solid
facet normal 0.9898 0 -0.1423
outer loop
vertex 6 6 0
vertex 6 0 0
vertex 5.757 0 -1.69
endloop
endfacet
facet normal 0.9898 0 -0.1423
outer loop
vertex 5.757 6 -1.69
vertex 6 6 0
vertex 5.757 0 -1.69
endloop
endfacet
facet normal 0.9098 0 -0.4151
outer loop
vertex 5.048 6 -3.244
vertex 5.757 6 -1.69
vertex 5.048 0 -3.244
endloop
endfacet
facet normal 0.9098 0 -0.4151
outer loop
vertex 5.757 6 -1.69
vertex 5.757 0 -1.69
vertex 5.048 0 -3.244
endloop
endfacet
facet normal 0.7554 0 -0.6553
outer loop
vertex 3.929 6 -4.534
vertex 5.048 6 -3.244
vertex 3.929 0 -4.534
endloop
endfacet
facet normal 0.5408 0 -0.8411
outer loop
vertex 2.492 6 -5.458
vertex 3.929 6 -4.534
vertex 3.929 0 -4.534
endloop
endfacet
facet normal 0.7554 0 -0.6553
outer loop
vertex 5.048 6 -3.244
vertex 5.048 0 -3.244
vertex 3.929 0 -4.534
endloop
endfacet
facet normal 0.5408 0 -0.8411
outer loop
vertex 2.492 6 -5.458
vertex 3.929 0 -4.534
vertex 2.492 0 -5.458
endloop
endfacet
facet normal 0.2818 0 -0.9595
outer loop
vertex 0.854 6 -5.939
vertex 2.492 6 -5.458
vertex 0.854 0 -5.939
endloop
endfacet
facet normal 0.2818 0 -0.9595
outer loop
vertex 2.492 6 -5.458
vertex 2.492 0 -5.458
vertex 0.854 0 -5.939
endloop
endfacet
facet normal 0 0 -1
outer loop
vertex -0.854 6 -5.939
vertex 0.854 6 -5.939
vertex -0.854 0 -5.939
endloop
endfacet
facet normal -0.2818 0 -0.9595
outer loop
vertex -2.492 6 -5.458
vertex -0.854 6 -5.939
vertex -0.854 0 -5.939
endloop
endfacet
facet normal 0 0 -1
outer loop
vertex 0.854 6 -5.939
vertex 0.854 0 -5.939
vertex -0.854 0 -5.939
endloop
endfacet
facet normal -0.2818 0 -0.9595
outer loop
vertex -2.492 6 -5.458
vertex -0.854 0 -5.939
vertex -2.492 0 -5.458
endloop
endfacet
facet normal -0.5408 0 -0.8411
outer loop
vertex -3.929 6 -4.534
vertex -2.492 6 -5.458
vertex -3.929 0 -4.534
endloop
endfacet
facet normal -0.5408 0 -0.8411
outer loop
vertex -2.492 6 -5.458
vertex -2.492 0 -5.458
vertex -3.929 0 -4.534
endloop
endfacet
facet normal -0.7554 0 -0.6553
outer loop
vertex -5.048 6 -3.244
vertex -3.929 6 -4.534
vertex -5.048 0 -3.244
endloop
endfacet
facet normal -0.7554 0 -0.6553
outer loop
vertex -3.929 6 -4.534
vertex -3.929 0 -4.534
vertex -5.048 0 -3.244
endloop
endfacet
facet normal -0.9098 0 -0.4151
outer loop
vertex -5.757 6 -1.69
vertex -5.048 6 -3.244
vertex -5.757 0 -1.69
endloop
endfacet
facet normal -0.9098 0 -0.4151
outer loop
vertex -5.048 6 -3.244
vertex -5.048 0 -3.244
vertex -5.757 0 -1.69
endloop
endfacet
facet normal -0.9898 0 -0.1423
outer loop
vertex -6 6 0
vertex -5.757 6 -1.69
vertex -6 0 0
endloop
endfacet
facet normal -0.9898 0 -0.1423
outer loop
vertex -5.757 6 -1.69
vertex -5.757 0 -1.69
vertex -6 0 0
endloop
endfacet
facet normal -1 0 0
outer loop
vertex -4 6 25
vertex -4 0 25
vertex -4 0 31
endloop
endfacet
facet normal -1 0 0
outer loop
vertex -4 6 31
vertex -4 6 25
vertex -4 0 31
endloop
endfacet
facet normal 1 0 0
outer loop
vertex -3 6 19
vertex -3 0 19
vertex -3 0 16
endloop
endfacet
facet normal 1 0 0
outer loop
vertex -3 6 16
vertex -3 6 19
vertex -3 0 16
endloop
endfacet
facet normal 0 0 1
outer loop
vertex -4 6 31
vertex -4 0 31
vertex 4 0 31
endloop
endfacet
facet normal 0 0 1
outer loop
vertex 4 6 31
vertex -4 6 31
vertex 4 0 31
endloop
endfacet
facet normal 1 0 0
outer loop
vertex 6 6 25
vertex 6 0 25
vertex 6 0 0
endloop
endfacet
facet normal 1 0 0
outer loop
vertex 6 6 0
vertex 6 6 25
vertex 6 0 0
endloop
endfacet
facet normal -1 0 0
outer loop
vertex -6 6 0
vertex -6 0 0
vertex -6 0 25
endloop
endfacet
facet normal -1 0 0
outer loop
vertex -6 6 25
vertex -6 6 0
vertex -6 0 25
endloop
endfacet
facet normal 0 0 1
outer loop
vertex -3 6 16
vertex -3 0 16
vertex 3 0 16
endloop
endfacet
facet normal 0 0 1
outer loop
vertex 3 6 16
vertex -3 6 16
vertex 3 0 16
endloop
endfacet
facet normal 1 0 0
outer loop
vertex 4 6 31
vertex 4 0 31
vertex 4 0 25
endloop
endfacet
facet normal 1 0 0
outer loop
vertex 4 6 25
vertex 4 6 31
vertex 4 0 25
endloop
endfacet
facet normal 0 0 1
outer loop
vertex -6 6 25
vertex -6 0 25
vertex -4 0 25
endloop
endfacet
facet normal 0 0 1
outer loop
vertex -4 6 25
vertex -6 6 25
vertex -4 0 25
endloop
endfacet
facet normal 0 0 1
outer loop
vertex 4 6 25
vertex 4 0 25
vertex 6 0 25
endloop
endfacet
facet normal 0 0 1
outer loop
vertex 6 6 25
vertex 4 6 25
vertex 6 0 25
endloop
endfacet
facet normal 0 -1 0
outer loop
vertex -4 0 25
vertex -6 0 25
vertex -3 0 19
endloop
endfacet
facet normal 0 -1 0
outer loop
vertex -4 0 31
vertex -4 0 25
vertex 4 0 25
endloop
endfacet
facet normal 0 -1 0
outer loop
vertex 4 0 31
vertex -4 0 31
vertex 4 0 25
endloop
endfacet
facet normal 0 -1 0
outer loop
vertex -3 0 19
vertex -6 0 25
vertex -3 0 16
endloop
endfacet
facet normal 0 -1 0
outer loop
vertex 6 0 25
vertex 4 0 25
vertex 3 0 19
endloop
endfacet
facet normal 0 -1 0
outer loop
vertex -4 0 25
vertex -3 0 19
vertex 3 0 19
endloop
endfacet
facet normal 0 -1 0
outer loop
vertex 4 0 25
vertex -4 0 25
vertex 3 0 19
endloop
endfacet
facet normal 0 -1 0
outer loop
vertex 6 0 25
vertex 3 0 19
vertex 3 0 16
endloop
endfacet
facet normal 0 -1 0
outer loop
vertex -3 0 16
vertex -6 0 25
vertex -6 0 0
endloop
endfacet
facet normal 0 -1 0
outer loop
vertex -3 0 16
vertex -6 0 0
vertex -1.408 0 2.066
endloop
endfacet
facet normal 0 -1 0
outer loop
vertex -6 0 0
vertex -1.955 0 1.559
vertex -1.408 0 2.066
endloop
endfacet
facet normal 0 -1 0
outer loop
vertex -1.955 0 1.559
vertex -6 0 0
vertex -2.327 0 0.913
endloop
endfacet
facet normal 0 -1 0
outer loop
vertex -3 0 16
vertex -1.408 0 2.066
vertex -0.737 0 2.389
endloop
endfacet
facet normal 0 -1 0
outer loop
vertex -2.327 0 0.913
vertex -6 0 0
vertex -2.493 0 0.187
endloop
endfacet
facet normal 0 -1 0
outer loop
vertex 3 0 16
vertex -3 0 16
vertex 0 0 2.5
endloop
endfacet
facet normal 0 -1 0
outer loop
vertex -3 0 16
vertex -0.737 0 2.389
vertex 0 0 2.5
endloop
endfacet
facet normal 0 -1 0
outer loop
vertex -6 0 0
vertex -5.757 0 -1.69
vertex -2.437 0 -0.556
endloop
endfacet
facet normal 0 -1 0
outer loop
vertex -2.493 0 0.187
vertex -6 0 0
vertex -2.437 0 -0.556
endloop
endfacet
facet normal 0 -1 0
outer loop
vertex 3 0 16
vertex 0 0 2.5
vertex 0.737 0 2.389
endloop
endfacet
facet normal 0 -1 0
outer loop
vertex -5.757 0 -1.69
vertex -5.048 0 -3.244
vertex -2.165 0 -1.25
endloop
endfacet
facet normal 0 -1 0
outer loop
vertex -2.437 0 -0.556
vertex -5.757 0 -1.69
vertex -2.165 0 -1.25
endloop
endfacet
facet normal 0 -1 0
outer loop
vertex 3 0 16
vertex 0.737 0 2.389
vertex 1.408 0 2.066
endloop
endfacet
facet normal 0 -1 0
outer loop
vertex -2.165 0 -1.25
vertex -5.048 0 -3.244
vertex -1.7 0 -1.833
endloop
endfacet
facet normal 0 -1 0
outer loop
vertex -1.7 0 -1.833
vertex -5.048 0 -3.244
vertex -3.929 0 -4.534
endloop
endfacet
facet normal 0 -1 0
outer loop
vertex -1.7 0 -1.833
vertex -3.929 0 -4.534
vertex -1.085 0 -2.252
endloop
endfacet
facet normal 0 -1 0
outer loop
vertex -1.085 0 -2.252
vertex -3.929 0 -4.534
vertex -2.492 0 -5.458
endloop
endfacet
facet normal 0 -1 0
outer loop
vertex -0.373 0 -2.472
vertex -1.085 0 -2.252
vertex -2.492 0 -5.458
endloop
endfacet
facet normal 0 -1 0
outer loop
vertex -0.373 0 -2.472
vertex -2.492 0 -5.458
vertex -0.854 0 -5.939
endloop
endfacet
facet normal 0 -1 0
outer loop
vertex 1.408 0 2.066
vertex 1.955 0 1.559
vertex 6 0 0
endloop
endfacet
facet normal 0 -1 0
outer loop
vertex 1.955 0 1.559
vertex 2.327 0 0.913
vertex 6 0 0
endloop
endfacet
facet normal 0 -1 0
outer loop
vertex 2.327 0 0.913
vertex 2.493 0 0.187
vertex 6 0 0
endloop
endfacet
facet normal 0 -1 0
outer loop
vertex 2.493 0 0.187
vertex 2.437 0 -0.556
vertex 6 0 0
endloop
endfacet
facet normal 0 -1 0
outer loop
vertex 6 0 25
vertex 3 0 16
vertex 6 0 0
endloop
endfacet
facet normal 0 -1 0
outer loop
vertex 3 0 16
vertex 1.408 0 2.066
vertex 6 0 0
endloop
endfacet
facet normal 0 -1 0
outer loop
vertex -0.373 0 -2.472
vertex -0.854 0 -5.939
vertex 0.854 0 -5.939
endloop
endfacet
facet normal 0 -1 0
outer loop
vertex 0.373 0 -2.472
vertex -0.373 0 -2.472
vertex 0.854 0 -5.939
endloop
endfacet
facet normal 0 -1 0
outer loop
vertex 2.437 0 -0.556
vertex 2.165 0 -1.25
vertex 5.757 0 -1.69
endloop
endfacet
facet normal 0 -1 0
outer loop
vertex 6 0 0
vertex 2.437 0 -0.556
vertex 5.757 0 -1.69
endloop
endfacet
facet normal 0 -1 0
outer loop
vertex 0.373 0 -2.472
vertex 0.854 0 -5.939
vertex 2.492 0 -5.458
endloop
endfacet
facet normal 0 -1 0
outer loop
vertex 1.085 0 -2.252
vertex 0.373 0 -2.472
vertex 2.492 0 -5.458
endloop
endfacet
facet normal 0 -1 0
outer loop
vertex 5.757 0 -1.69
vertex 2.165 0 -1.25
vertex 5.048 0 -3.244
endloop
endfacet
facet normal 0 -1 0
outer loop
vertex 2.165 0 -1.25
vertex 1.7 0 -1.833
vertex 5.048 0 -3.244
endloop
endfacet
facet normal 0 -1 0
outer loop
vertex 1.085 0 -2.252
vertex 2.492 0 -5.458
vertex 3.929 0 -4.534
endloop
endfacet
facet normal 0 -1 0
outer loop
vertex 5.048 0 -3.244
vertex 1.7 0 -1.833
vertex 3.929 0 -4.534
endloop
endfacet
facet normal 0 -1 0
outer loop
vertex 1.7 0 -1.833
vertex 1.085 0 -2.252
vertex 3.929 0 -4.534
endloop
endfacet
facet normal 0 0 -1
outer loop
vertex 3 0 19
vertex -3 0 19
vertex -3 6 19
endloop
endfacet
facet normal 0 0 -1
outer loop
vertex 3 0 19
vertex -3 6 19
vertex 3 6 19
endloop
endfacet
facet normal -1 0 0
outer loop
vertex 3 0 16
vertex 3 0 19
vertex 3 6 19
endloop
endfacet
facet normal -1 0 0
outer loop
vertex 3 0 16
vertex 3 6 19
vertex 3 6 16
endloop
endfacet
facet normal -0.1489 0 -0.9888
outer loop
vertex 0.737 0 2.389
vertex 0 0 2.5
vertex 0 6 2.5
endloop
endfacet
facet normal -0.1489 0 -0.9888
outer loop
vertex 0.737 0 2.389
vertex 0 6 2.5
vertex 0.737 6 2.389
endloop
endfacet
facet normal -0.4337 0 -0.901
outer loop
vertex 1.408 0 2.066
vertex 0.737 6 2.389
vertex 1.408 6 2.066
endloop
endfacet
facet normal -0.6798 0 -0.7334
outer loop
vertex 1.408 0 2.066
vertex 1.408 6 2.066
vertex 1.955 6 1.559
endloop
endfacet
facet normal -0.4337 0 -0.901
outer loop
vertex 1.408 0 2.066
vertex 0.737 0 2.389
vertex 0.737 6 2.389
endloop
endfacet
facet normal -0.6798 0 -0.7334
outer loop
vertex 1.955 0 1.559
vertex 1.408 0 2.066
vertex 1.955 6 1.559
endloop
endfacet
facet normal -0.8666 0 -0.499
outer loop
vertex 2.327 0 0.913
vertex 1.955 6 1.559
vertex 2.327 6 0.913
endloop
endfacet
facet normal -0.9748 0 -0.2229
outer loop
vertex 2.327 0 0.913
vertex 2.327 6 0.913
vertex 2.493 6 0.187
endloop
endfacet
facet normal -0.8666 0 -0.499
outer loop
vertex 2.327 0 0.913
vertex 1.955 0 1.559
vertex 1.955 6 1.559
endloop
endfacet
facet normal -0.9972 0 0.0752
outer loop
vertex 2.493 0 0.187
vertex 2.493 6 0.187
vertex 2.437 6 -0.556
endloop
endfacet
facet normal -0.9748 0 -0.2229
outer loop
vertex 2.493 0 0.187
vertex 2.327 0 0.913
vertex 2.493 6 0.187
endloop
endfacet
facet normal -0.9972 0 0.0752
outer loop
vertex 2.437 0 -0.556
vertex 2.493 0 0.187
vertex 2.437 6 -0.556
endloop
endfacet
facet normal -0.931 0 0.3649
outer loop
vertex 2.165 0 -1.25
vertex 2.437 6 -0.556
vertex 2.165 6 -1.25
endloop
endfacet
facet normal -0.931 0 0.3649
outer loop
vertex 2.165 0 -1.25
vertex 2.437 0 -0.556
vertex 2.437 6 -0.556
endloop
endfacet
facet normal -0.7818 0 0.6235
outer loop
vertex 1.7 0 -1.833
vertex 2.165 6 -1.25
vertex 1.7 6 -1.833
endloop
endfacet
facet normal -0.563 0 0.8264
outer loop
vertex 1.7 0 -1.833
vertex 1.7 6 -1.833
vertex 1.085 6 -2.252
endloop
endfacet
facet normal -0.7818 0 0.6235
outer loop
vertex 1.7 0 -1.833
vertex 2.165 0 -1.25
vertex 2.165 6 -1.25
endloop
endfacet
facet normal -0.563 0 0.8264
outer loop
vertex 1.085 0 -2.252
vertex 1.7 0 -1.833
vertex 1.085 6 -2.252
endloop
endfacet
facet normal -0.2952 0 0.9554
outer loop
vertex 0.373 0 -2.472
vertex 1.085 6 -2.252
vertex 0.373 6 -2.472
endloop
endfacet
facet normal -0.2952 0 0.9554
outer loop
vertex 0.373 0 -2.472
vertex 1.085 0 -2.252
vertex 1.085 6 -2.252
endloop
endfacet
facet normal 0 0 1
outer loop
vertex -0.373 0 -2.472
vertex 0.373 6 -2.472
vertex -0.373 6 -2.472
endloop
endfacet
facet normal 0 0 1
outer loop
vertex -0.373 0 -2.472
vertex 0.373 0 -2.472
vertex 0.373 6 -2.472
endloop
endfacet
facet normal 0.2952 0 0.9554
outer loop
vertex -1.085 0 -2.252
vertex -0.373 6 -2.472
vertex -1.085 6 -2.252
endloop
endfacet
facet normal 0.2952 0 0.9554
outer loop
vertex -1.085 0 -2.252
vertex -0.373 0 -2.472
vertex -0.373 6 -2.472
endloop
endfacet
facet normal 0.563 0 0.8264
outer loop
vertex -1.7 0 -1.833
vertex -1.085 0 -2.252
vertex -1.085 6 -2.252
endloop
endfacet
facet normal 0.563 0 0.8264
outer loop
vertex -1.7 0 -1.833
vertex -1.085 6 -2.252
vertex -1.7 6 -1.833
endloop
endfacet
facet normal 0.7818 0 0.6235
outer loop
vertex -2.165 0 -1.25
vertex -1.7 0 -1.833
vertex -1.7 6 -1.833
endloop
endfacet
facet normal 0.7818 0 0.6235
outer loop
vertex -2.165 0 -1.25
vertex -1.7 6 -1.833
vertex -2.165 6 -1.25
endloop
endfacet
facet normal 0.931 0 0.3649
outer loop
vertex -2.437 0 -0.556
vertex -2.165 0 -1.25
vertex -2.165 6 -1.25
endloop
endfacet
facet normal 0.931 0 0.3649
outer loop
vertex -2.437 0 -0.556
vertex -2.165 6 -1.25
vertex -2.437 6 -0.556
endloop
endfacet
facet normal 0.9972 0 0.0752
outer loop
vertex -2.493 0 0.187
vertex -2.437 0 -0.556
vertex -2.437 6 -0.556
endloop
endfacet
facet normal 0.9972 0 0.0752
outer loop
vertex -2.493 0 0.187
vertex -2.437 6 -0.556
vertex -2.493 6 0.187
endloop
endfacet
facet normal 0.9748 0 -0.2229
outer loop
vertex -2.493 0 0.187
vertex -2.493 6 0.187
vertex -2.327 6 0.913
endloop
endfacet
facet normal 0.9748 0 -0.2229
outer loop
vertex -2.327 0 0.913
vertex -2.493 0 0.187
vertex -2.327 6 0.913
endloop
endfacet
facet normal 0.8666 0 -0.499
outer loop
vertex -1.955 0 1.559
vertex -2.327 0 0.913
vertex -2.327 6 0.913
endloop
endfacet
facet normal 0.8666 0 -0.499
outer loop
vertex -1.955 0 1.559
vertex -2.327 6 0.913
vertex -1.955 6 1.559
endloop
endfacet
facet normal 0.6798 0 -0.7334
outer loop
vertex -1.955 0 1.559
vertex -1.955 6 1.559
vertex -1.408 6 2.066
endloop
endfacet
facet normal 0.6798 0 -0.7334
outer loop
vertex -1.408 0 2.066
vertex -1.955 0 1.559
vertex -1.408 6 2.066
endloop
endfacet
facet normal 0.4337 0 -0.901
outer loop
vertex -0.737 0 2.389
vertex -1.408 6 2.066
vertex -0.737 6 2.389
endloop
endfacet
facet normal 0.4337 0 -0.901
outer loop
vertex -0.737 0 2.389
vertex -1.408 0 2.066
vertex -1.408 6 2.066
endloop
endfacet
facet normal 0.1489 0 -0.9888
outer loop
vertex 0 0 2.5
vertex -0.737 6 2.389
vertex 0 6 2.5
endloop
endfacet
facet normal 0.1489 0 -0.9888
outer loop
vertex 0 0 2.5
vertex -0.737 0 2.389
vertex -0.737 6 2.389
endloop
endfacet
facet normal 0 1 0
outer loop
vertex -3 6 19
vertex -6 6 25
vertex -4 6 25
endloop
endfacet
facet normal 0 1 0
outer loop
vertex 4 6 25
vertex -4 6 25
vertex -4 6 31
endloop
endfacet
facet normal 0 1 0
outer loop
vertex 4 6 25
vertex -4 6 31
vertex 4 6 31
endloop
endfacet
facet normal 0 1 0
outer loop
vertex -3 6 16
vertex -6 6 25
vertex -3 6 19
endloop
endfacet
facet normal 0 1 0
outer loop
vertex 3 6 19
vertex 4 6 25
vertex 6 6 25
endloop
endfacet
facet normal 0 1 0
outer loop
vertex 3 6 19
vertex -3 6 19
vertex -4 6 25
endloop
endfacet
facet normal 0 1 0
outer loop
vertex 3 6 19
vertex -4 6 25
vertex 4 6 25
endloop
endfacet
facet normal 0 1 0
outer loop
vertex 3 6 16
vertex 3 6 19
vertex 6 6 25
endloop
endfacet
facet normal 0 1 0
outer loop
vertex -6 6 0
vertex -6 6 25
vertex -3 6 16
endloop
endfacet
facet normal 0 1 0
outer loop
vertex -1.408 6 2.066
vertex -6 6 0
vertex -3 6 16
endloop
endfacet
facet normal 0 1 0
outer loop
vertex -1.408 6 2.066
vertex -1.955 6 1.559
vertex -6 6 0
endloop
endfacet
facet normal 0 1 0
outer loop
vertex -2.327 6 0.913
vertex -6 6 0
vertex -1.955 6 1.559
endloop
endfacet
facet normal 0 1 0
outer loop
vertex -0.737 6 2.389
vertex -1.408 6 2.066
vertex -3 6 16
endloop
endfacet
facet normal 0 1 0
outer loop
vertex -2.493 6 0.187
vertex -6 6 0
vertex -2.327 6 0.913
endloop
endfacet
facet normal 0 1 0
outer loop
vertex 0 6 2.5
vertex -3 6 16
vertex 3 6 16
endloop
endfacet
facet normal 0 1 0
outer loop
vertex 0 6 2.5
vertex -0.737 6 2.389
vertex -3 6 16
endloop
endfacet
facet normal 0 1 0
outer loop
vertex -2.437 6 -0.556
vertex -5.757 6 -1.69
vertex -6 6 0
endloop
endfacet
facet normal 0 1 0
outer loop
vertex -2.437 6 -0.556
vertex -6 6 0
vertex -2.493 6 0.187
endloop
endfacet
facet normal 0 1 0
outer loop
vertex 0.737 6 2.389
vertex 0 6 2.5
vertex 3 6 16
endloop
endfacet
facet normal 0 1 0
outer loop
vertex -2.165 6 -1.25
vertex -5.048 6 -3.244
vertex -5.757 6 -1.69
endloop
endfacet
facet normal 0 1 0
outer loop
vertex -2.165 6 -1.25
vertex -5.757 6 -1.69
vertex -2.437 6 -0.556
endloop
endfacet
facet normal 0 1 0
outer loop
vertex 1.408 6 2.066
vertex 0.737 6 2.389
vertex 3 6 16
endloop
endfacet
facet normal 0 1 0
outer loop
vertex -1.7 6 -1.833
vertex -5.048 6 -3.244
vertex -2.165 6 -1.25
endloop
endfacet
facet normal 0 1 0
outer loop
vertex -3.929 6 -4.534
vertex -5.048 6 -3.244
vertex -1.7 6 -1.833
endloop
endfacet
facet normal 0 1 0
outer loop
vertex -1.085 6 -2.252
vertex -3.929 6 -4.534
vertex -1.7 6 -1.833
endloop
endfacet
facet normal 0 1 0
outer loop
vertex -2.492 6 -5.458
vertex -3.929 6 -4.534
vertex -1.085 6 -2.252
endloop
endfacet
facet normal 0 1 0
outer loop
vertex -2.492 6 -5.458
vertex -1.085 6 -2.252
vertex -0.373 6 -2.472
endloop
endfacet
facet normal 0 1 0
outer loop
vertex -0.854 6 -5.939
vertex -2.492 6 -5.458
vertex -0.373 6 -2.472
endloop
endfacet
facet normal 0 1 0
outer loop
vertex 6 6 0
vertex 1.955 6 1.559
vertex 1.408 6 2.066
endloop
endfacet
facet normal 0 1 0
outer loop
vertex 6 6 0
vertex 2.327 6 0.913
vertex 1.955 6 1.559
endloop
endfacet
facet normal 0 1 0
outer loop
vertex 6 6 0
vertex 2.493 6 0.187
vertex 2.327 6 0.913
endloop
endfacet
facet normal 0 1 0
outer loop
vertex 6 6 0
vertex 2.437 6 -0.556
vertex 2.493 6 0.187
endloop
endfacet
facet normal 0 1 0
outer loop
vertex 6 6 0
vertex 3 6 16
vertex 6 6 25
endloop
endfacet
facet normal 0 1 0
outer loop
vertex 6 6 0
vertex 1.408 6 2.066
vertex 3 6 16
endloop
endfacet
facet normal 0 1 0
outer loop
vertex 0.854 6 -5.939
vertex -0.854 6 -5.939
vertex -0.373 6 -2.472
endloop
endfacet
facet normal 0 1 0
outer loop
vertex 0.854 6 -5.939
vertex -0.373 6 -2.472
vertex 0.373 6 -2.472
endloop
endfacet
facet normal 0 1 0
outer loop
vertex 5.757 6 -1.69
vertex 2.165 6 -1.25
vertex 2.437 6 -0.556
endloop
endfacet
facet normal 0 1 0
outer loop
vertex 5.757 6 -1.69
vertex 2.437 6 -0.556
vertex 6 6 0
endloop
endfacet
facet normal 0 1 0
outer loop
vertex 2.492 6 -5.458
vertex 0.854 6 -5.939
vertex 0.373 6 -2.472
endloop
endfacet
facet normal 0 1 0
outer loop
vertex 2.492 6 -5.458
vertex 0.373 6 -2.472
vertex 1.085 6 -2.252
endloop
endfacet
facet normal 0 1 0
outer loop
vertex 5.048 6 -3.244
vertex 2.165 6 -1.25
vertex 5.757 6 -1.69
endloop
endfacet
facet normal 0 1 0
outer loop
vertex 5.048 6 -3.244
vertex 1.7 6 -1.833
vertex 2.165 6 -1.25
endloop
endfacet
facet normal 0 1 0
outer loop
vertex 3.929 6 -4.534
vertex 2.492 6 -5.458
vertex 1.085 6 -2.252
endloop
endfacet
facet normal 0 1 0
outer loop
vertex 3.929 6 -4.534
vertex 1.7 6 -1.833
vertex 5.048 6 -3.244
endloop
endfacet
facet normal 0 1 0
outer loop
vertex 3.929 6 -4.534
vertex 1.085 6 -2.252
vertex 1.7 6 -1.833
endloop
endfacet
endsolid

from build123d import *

# Parameters (mm, degrees)
SKETCH1_R           = 2.5
SKETCH1_W           = 6
SKETCH1_H           = 3
BOSS_EXTRUDE1_DEPTH = 6


with BuildPart() as part:
    # Sketch1 → Boss-Extrude1 (new body)
    with BuildSketch(Plane(origin=(0, 0, 0), x_dir=(1, 0, 0), z_dir=(0, 1, 0))):
        with BuildLine():
            Line((-6, 0), (-6, -25))
            Line((-6, -25), (-4, -25))
            Line((-4, -25), (-4, -31))
            Line((-4, -31), (4, -31))
            Line((4, -31), (4, -25))
            Line((4, -25), (6, -25))
            Line((6, -25), (6, 0))
            ThreePointArc((6, 0), (0, 6), (-6, 0))
        make_face()
        with Locations(Location((0, 0, 0), (0, 0, 270))):
            Circle(SKETCH1_R, mode=Mode.SUBTRACT)
        with Locations((0, -17.5)):
            Rectangle(SKETCH1_W, SKETCH1_H, mode=Mode.SUBTRACT)
    extrude(amount=BOSS_EXTRUDE1_DEPTH)


solid = part.part
